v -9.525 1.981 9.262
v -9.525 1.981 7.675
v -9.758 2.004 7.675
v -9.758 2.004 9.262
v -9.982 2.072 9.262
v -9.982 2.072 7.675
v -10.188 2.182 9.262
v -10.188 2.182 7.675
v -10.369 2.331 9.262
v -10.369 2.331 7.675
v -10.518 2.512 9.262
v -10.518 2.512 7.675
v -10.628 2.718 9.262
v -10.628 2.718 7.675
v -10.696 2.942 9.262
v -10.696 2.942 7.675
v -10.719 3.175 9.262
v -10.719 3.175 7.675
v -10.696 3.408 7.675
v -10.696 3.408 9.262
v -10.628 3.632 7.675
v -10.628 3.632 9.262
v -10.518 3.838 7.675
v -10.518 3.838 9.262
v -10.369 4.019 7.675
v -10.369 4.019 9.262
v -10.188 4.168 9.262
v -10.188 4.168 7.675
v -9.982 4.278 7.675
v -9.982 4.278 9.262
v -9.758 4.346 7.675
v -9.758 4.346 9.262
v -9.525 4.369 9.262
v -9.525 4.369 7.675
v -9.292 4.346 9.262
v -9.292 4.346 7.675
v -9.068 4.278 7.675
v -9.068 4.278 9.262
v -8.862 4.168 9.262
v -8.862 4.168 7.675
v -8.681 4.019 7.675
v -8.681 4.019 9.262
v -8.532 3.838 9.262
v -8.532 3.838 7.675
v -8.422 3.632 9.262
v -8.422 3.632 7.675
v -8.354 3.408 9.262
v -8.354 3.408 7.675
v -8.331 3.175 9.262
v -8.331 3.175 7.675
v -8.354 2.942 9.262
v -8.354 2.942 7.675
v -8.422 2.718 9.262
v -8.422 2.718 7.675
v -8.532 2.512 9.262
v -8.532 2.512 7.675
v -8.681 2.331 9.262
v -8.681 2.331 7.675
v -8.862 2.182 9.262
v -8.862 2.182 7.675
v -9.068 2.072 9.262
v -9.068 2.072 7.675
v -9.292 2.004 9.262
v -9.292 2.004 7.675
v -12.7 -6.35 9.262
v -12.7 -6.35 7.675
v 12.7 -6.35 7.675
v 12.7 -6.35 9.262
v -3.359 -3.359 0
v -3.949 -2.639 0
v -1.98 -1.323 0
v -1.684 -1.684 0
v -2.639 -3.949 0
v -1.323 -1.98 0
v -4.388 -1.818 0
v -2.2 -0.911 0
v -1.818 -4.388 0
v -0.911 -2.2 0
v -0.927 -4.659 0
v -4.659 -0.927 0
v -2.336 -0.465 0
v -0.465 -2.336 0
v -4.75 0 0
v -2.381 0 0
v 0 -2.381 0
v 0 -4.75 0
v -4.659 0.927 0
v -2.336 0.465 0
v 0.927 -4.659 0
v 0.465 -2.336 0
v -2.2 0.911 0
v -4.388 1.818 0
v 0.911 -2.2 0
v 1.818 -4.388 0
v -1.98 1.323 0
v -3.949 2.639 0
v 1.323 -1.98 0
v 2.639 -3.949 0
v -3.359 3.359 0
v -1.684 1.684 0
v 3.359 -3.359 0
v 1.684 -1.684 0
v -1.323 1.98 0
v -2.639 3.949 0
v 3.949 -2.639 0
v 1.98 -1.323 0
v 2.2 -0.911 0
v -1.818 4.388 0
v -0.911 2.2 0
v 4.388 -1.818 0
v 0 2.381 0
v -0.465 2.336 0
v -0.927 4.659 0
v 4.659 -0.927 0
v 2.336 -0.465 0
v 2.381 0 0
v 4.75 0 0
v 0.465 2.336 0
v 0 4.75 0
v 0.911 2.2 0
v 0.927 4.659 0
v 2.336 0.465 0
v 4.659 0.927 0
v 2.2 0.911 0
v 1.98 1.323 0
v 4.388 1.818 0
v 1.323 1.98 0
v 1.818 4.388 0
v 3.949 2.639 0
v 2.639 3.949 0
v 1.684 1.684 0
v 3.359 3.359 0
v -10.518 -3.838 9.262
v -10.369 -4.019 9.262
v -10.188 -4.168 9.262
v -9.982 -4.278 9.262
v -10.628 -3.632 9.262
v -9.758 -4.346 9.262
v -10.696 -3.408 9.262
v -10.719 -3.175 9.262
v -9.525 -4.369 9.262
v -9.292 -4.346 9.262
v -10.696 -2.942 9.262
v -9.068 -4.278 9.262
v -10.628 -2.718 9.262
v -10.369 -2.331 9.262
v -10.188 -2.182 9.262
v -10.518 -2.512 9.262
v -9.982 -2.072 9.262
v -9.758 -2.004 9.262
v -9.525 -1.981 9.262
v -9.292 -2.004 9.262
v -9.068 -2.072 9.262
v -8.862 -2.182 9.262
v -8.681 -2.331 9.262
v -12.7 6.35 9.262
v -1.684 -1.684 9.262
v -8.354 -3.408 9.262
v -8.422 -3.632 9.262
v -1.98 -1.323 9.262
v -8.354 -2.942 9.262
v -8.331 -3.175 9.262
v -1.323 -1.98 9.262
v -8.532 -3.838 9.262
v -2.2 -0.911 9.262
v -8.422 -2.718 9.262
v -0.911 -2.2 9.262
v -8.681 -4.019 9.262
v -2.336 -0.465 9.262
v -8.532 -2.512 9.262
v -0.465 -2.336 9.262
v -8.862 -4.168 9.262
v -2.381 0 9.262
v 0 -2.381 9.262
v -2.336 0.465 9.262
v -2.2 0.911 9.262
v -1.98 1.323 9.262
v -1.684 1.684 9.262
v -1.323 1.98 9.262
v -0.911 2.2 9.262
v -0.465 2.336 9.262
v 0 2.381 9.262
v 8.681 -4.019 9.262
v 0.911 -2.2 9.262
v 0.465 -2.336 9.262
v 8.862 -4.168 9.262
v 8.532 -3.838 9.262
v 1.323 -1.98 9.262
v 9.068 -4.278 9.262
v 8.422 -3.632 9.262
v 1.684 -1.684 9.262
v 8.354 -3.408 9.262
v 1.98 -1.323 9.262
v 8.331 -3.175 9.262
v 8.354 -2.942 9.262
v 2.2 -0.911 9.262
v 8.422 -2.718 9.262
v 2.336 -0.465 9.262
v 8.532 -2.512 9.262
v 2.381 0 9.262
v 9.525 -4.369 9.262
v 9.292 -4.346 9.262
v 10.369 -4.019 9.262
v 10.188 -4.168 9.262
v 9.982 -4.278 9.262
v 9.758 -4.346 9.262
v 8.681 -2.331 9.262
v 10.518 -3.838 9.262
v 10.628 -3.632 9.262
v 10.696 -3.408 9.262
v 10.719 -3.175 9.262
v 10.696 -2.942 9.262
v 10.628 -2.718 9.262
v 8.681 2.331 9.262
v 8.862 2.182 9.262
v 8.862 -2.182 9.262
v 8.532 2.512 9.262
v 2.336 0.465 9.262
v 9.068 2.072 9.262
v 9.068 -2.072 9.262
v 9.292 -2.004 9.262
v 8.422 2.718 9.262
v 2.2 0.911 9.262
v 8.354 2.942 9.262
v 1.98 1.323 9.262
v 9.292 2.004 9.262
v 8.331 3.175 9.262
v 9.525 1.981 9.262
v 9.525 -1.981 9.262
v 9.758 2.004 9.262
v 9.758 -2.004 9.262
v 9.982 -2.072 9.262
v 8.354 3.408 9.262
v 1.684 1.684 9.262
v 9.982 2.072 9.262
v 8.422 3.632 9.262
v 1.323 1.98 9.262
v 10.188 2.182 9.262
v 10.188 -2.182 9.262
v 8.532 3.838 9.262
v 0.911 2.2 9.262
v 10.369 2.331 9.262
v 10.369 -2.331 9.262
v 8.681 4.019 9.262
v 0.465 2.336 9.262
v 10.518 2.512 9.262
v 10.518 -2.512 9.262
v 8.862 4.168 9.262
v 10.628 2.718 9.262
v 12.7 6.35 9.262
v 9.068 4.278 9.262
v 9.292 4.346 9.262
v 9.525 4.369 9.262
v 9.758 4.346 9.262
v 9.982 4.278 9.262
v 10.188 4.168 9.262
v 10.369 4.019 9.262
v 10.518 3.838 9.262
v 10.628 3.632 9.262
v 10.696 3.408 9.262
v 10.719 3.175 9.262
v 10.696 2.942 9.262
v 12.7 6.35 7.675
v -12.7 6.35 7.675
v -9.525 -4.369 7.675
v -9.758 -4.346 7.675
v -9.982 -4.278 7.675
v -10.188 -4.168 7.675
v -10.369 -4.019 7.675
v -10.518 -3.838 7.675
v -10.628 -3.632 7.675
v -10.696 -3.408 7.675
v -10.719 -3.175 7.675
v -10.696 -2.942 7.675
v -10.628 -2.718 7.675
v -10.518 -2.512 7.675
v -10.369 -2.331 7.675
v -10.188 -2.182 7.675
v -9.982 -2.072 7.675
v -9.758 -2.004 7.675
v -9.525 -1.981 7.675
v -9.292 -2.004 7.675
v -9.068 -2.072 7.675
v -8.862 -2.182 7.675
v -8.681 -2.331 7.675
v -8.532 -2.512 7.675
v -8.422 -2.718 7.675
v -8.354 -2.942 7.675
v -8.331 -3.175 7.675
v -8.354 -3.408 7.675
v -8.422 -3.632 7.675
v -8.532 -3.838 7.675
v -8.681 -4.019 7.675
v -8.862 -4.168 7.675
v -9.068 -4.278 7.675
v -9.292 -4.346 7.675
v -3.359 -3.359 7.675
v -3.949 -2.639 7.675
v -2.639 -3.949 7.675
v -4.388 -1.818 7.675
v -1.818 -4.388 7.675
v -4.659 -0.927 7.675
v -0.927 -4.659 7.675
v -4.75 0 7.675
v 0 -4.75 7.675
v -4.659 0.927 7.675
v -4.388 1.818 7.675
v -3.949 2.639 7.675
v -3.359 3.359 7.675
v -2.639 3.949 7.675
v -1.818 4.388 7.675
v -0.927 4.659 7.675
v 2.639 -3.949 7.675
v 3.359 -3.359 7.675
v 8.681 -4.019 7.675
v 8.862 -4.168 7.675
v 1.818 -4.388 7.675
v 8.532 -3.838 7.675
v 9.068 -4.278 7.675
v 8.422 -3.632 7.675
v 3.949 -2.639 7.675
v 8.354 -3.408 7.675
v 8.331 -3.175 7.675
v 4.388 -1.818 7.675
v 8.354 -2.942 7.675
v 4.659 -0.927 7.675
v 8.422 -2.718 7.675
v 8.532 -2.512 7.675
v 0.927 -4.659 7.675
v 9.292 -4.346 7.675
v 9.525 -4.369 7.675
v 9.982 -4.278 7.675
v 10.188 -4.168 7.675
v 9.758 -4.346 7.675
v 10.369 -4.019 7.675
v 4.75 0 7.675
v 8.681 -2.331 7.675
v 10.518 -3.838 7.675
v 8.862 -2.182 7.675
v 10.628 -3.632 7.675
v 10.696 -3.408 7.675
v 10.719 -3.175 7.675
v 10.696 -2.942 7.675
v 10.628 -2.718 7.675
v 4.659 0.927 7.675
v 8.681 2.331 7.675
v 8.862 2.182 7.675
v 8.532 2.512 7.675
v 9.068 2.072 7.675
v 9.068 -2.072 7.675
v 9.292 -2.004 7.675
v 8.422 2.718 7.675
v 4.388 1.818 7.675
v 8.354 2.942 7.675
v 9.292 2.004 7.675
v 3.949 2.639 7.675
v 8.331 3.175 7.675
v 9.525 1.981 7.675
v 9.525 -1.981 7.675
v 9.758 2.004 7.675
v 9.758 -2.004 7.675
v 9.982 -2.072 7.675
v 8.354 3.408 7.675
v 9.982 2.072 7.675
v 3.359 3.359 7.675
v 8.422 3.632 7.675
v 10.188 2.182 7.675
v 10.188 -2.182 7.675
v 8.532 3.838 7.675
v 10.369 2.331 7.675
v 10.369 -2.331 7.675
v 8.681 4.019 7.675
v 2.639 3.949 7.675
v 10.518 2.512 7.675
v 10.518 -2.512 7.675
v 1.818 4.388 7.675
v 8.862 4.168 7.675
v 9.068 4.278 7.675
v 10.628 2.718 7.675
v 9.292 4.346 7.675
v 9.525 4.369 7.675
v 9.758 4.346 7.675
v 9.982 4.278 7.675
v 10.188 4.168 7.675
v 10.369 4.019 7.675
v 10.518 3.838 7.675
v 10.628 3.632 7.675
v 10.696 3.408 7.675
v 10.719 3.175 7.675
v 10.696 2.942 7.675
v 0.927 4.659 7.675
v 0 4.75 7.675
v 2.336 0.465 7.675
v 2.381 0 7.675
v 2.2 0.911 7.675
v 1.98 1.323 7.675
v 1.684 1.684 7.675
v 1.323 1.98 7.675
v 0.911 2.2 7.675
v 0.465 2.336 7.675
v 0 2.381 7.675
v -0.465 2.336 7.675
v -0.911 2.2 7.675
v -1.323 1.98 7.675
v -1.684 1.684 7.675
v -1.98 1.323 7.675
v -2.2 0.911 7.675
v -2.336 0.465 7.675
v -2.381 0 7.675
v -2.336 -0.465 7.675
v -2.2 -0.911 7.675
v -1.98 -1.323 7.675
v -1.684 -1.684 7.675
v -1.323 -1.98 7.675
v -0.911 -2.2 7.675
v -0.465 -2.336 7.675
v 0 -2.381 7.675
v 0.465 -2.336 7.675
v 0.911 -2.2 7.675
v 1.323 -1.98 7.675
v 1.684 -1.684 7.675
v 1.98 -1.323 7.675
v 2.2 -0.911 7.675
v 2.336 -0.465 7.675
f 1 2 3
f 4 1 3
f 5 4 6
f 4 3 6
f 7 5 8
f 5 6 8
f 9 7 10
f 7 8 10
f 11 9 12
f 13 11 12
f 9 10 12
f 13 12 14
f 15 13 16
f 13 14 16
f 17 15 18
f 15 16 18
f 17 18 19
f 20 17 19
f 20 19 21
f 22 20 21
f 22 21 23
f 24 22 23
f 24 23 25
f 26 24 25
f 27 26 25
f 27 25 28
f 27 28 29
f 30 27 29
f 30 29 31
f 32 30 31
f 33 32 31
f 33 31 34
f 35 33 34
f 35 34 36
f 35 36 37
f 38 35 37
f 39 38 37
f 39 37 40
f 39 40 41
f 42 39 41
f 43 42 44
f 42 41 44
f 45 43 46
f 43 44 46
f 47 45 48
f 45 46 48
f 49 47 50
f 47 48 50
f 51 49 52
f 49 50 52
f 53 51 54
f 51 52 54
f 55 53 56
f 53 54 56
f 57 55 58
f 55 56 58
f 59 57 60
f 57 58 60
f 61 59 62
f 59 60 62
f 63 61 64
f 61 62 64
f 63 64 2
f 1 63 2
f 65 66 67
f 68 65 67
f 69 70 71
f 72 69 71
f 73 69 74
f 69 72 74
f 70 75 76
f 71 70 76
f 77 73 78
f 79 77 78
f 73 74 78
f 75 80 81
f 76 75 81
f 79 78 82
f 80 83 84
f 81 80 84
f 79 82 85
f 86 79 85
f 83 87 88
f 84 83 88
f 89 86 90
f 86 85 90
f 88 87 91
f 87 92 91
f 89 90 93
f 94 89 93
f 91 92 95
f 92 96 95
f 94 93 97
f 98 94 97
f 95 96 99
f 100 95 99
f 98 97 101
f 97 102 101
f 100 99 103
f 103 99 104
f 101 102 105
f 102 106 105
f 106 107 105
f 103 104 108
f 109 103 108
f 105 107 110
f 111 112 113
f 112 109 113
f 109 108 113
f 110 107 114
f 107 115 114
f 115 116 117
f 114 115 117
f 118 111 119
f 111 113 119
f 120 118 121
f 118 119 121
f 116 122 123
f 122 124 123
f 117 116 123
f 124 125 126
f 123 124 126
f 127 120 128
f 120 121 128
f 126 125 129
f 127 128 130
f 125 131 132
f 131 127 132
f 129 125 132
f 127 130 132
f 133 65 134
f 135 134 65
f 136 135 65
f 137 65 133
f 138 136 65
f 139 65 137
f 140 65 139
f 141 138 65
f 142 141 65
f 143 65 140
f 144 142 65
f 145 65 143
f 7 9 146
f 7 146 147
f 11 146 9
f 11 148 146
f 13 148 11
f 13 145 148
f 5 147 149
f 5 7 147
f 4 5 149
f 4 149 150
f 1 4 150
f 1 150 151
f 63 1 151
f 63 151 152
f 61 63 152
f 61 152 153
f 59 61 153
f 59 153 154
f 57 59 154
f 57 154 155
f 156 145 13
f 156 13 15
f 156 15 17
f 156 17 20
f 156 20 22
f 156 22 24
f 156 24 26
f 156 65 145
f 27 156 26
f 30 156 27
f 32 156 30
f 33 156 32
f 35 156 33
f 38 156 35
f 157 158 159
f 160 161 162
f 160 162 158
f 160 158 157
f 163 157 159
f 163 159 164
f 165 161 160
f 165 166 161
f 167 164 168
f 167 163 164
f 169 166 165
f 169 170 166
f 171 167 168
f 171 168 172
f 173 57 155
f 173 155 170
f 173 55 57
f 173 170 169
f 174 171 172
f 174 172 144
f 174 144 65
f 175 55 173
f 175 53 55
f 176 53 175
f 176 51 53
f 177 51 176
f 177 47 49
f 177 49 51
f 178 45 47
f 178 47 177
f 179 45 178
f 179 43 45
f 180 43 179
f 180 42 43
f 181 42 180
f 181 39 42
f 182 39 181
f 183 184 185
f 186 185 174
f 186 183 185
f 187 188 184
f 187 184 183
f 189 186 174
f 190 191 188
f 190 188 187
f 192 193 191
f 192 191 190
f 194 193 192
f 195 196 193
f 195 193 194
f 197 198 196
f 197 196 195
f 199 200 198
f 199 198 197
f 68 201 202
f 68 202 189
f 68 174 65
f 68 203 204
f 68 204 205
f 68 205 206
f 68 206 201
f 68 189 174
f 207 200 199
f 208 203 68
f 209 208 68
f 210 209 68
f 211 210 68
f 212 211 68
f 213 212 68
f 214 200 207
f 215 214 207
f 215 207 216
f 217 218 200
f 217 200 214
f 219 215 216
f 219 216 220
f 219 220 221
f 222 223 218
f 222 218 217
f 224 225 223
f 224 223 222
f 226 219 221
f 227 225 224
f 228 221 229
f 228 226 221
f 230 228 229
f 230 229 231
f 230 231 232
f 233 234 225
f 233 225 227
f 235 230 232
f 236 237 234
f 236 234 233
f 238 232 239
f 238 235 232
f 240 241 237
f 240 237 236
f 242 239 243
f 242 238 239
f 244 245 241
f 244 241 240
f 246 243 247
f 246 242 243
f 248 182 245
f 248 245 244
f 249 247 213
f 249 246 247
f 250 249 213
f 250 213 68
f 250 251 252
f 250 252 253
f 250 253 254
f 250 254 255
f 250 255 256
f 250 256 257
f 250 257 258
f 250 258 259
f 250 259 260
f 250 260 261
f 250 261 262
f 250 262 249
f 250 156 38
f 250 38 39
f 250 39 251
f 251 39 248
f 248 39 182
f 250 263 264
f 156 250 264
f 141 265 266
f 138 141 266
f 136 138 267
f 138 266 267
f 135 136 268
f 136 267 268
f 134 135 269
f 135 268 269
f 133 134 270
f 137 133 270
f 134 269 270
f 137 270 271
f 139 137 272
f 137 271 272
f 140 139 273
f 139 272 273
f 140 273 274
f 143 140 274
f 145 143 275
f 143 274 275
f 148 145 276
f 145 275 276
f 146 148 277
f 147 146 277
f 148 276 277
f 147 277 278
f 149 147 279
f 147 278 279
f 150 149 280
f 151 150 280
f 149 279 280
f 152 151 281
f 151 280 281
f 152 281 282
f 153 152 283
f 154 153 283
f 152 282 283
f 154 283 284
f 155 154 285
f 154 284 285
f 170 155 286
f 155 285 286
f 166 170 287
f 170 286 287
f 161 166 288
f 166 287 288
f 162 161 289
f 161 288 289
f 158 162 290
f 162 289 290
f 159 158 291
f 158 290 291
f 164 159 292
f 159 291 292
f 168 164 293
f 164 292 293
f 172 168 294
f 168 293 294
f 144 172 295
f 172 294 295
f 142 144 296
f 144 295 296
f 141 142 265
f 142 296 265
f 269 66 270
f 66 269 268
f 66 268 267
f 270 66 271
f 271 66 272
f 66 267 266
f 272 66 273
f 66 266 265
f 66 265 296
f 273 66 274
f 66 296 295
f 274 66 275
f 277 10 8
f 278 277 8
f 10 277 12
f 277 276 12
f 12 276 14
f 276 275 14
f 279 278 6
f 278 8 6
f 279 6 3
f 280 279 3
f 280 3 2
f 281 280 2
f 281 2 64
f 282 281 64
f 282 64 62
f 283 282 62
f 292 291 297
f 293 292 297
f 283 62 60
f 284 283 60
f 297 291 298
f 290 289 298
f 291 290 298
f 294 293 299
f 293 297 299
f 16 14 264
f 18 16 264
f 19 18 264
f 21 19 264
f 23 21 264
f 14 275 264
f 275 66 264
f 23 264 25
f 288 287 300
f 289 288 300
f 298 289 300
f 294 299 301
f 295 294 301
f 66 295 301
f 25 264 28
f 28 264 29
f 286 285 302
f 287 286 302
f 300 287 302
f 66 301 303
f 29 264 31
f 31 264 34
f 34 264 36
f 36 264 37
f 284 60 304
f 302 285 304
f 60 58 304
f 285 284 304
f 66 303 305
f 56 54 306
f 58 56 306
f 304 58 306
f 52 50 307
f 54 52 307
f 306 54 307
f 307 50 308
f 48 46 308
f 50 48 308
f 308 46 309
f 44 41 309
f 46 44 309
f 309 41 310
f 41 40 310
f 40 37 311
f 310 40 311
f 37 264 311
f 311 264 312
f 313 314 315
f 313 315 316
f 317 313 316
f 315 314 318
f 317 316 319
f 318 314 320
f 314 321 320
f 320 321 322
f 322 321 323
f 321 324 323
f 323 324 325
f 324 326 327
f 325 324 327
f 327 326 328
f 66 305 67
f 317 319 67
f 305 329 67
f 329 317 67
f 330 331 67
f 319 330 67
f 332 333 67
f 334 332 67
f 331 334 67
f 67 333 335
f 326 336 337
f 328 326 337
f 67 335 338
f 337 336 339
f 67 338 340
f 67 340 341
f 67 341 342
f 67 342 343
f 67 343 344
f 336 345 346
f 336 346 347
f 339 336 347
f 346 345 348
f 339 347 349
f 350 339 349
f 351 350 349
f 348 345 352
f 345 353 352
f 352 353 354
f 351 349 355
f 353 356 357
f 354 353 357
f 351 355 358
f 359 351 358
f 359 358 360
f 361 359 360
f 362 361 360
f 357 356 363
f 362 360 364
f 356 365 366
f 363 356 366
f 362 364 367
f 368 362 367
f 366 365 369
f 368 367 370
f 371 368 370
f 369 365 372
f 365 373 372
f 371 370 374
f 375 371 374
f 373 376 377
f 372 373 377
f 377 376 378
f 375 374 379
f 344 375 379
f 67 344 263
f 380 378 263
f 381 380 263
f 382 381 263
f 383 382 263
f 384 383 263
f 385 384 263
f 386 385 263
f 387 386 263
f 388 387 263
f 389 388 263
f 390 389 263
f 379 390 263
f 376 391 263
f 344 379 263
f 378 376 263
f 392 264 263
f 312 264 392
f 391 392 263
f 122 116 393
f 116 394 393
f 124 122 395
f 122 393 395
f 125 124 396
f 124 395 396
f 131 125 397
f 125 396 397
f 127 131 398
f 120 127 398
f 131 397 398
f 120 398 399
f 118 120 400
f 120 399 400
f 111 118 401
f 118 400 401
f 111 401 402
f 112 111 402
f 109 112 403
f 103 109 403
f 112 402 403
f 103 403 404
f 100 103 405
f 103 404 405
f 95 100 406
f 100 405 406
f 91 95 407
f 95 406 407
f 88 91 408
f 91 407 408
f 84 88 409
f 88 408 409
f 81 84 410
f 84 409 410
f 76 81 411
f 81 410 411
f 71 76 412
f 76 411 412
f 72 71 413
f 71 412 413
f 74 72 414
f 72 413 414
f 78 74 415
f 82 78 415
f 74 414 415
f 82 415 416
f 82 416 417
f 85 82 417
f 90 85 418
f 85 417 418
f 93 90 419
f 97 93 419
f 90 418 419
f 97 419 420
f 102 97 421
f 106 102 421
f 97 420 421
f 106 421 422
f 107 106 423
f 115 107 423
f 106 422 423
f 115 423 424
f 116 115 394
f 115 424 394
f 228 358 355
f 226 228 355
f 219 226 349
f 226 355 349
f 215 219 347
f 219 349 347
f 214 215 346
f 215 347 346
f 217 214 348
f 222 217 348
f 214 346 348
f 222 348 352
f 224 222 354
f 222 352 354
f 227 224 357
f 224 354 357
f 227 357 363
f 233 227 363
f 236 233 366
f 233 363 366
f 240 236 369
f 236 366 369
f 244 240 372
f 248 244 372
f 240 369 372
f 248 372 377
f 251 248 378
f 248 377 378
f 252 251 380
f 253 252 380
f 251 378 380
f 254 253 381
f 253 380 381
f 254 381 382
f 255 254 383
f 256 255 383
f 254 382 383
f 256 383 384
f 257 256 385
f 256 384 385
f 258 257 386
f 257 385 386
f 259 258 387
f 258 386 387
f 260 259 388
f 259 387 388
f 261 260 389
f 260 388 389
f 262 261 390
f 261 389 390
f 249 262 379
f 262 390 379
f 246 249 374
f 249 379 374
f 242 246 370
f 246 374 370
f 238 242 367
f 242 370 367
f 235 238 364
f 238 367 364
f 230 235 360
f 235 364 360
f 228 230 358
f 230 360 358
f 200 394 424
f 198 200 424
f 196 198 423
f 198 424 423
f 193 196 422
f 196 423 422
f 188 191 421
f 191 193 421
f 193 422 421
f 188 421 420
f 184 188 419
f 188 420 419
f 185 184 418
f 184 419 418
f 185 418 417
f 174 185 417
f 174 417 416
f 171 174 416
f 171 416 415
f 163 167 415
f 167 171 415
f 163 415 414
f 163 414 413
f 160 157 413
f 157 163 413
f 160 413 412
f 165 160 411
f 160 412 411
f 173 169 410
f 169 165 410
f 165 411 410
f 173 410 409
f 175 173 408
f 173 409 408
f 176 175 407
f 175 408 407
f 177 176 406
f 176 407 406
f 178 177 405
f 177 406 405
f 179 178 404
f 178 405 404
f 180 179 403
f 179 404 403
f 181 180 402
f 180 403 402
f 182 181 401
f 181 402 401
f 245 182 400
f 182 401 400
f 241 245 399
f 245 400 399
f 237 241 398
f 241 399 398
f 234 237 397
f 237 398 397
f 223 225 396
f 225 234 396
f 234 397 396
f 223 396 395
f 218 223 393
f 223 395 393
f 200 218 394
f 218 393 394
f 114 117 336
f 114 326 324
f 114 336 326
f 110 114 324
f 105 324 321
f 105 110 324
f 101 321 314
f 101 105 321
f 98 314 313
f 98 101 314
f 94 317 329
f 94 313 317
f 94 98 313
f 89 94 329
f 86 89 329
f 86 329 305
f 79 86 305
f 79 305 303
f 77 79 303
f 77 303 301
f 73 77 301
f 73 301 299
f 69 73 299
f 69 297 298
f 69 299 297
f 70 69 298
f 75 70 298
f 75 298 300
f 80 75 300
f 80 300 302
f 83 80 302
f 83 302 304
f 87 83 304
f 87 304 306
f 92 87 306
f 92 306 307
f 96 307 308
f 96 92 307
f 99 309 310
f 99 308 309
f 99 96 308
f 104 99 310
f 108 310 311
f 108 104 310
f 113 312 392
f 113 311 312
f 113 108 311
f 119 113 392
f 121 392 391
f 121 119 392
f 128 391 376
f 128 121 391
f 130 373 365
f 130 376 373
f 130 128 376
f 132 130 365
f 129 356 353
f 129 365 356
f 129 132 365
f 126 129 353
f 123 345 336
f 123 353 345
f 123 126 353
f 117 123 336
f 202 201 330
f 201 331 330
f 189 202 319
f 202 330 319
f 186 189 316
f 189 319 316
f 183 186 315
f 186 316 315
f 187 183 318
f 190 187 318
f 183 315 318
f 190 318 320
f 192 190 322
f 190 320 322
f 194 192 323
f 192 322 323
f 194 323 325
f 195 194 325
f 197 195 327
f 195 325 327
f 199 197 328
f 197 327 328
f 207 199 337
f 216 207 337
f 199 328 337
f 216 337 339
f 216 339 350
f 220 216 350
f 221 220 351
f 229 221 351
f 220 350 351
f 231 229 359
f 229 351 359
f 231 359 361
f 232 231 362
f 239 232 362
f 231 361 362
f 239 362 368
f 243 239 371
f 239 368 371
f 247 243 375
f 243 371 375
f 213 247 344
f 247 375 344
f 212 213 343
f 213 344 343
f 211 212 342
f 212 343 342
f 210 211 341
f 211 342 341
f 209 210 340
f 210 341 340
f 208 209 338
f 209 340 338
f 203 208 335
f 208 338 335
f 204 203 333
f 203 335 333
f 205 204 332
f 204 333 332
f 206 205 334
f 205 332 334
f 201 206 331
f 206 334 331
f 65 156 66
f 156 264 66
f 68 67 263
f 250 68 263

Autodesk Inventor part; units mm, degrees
ref_plane "YZ Plane" through (0, 0, 0) normal (1, 0, 0) x (0, 1, 0)
ref_plane "XZ Plane" through (0, 0, 0) normal (0, 1, 0) x (-1, 0, 0)
ref_plane "XY Plane" through (0, 0, 0) normal (0, 0, 1) x (1, 0, 0)
sketch "Sketch1" plane through (0, 0, 0) normal (0, 0, 1) x (1, 0, 0)
  circle A0 centre (0, 0) radius 4.75
  dimension "d0" = 9.5
extrude "Extrusion1" add sketch "Sketch1" along normal blind 7.675
sketch "Sketch2" plane through (0, 0, 7.675) normal (0, 0, 1) x (1, 0, 0)
  circle A0 centre (0, 0) radius 4.75 projected
  circle A1 centre (0, 0) radius 2.3813
  dimension "d3" = 4.7625
extrude "Extrusion2" cut sketch "Sketch2" against normal through all contours A1
sketch "Sketch3" plane through (0, 0, 7.675) normal (0, 0, 1) x (1, 0, 0)
  circle A0 centre (0, 0) radius 2.3813 projected
  line L0 (-12.7, -6.35) -> (12.7, -6.35)
  line L1 (12.7, -6.35) -> (12.7, 6.35)
  line L2 (12.7, 6.35) -> (-12.7, 6.35)
  line L3 (-12.7, 6.35) -> (-12.7, -6.35)
  dimension "d6" = 25.4
  dimension "d7" = 12.7
extrude "Extrusion3" add sketch "Sketch3" along normal blind 1.5875
sketch "Sketch4" plane through (0, 0, 9.2625) normal (0, 0, 1) x (1, 0, 0)
  point P0 (-9.525, -3.175)
  point P1 (-9.525, 3.175)
  point P2 (9.525, 3.175)
  point P3 (9.525, -3.175)
hole "Hole1" at (-9.525, -3.175, 9.2625) at (-9.525, 3.175, 9.2625) at (9.525, 3.175, 9.2625) at (9.525, -3.175, 9.2625) direction (0, 0, -1) diameter 2.3876 end through all clearance for "Flat Head Machine Screw" size "M2" standard "Ansi Metric M Profile"
properties part number "ferrous_insert"
